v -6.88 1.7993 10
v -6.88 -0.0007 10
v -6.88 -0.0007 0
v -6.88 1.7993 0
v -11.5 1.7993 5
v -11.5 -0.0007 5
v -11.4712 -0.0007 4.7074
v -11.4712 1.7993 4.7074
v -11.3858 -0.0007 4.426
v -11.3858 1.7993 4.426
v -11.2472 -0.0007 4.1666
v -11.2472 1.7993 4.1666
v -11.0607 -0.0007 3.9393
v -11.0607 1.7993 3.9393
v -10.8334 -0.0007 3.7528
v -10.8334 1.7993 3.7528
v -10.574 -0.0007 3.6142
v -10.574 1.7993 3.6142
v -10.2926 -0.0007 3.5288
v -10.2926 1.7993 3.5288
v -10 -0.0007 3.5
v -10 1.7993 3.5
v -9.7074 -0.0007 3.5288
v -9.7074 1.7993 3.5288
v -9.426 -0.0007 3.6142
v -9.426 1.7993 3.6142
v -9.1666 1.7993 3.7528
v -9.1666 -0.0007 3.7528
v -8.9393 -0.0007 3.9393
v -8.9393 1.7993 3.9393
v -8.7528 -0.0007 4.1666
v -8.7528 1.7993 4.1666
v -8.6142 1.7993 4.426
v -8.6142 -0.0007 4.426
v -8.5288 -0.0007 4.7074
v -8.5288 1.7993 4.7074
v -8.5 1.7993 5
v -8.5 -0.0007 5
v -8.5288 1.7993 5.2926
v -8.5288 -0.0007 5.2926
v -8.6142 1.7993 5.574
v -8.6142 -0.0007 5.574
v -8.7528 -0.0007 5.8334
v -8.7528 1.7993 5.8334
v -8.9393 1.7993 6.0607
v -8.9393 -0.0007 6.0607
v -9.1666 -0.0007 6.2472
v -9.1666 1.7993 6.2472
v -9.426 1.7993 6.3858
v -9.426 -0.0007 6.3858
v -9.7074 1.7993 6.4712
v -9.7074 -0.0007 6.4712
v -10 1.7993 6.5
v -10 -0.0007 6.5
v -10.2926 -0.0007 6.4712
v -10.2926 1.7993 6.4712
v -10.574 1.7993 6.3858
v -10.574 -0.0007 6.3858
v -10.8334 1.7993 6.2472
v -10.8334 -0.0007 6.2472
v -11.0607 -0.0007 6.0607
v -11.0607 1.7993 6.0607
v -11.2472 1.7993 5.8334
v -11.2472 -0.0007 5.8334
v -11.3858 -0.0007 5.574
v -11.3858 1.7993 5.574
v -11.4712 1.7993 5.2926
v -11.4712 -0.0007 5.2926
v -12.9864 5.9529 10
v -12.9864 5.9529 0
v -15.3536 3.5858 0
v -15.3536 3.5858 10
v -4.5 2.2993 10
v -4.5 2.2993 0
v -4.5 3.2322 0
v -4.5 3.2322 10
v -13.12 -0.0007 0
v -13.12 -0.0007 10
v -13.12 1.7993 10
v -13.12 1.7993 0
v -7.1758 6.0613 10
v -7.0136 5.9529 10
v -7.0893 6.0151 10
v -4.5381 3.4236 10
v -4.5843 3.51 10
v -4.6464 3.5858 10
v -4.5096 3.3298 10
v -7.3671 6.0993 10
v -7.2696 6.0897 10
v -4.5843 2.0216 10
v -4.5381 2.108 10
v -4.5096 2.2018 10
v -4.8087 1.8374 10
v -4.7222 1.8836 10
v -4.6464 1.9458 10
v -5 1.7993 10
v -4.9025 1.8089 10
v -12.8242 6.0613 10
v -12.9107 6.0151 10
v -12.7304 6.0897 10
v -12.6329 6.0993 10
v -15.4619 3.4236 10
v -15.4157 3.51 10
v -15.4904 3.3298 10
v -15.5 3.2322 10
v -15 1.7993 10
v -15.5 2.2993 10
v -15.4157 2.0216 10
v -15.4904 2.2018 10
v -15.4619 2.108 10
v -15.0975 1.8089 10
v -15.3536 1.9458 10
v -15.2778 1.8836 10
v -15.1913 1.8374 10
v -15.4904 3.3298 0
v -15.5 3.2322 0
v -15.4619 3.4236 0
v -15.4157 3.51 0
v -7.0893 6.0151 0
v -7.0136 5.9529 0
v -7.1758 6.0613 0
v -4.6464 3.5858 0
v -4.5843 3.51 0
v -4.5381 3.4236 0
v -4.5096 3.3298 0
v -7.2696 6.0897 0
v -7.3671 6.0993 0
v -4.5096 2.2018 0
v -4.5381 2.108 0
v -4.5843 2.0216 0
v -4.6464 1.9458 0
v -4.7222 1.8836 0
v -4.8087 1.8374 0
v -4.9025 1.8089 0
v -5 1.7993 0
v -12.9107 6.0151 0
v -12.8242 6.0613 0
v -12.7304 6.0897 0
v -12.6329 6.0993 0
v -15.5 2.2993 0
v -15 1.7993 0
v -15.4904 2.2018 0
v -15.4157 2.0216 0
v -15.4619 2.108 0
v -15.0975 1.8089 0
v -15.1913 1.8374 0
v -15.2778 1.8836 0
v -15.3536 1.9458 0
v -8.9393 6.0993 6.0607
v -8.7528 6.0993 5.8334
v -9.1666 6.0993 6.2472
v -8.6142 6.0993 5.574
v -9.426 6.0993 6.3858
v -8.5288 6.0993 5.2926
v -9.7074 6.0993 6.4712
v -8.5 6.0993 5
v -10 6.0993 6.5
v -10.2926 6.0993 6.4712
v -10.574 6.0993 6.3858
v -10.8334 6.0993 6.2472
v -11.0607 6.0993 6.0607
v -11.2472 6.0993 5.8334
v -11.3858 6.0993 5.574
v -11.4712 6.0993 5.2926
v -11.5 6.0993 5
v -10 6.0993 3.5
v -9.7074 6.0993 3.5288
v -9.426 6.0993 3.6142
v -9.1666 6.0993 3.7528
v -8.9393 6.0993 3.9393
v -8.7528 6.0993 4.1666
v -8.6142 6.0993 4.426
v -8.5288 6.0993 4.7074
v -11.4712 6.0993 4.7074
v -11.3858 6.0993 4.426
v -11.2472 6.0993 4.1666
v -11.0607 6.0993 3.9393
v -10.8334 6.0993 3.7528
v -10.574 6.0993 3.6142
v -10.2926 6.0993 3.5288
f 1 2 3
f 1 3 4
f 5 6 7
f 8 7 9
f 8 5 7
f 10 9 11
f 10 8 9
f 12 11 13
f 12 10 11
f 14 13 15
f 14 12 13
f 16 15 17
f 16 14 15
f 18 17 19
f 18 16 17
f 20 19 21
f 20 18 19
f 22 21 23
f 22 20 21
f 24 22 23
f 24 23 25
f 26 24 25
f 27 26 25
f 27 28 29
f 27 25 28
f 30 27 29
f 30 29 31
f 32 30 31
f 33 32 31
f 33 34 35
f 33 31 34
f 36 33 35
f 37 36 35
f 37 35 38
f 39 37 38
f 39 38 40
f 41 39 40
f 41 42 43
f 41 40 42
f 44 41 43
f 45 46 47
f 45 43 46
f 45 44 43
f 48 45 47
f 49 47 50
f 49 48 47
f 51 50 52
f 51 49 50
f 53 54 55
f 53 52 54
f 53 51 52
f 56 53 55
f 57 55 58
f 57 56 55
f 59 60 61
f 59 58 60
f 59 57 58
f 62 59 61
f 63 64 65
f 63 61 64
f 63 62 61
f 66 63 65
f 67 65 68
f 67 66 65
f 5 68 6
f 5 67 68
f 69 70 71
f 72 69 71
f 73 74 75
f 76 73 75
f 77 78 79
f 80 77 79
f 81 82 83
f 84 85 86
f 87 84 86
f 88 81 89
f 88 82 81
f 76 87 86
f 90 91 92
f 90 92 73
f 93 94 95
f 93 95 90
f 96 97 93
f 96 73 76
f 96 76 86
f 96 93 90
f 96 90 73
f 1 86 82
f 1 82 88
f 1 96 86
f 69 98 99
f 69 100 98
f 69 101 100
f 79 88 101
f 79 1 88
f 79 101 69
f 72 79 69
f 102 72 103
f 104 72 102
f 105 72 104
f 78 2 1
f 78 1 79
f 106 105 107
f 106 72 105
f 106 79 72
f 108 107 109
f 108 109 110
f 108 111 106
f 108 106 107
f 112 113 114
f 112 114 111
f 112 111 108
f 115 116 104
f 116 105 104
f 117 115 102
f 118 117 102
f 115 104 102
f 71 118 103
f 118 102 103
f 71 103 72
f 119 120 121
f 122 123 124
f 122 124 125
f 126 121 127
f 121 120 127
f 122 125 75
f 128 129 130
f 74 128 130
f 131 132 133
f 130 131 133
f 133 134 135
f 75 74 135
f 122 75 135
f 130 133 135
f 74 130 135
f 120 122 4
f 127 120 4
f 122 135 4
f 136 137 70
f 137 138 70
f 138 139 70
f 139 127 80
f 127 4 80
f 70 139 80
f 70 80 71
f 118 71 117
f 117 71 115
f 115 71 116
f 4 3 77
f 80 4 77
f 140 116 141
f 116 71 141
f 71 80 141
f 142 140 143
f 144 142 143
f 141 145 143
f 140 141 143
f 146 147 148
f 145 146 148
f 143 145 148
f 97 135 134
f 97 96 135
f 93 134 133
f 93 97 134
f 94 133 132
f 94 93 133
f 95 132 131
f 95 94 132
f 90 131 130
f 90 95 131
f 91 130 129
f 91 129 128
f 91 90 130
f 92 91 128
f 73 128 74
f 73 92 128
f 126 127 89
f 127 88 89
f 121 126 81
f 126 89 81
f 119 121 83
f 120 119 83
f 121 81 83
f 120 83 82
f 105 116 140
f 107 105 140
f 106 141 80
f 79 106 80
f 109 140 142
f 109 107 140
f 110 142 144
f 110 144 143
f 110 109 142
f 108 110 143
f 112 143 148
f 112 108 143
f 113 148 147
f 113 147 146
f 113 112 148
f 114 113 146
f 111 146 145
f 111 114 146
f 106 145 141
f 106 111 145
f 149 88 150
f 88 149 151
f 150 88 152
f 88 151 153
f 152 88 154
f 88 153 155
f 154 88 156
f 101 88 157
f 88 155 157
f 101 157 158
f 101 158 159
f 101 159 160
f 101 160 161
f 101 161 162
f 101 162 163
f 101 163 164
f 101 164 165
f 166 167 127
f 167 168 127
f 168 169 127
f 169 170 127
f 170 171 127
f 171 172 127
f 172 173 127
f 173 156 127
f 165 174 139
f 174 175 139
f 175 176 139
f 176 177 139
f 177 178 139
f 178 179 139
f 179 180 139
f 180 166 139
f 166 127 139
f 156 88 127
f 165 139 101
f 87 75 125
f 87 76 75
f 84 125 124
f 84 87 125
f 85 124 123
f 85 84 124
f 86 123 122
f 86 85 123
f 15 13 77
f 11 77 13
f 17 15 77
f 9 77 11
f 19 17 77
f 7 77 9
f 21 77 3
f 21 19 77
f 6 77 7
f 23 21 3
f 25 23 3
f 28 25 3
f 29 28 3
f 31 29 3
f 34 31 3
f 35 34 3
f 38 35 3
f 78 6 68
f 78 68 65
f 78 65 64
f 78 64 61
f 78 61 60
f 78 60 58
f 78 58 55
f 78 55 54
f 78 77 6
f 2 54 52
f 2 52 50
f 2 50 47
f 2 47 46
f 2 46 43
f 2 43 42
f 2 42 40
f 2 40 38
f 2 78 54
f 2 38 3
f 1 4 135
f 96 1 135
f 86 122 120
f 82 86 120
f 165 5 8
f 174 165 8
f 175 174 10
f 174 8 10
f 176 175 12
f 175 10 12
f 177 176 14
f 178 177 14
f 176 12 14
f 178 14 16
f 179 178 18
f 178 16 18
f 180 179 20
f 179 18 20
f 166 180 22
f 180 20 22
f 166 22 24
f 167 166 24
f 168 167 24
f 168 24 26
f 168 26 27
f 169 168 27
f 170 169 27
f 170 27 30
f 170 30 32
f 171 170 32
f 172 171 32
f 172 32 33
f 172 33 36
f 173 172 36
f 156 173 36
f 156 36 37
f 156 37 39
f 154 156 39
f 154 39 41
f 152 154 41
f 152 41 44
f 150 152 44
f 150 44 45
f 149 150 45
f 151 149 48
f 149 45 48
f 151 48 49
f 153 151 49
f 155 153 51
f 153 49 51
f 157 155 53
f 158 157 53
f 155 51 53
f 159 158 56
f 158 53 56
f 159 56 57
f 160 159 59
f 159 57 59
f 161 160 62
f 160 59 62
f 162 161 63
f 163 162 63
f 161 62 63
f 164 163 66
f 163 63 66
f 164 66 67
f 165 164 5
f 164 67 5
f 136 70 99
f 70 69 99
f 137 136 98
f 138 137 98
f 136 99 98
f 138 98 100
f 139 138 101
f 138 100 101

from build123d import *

# Parameters (mm, degrees)
SALIENTE_EXTRUIR1_DEPTH    = 10
REDONDEO1_R                = 0.5
REDONDEO2_R                = 0.5
CROQUIS3_W                 = 6.24
CROQUIS3_H                 = 1.8
SALIENTE_EXTRUIR2_DEPTH    = 10
CROQUIS2_R                 = 1.5
CORTAR_EXTRUIR1_DEPTH      = 2.8
CORTAR_EXTRUIR1_DEPTH_BACK = 5.3


with BuildPart() as part:
    # Croquis1 → Saliente-Extruir1 (new body)
    with BuildSketch(Plane(origin=(0, 0, 0), x_dir=(-1, 0, 0), z_dir=(0, 0, 1))):
        Polygon((4.5, -1.799339828), (4.5, -3.439339828), (7.16, -6.099339828), (9.75, -6.099339828), (12.84, -6.099339828), (15.5, -3.439339828), (15.5, -1.799339828), align=None)
    extrude(amount=SALIENTE_EXTRUIR1_DEPTH)

    # Redondeo1
    redondeo1_edges = [part.edges().sort_by_distance(p)[0] for p in [
        (-15.5, 1.799339828, 5),
    ]]
    fillet(redondeo1_edges, radius=REDONDEO1_R)

    # Redondeo2
    redondeo2_edges = [part.edges().sort_by_distance(p)[0] for p in [
        (-15.5, 3.439339828, 5),
        (-12.84, 6.099339828, 5),
        (-7.16, 6.099339828, 5),
        (-4.5, 3.439339828, 5),
        (-4.5, 1.799339828, 5),
    ]]
    fillet(redondeo2_edges, radius=REDONDEO2_R)

    # Croquis3 → Saliente-Extruir2 (add)
    with BuildSketch(Plane.XY.offset(10)):
        with Locations((-10, 0.899339828)):
            Rectangle(CROQUIS3_W, CROQUIS3_H)
    extrude(amount=-SALIENTE_EXTRUIR2_DEPTH)

    # Croquis2 → Cortar-Extruir1 (cut, two sides)
    with BuildSketch(Plane(origin=(0, 1.799339828, 0), x_dir=(-1, 0, 0), z_dir=(0, -1, 0))) as cortar_extruir1_sk:
        with Locations((10, -5)):
            Circle(CROQUIS2_R)
    extrude(amount=CORTAR_EXTRUIR1_DEPTH, mode=Mode.SUBTRACT)
    extrude(cortar_extruir1_sk.sketch, amount=-CORTAR_EXTRUIR1_DEPTH_BACK, mode=Mode.SUBTRACT)


solid = part.part
